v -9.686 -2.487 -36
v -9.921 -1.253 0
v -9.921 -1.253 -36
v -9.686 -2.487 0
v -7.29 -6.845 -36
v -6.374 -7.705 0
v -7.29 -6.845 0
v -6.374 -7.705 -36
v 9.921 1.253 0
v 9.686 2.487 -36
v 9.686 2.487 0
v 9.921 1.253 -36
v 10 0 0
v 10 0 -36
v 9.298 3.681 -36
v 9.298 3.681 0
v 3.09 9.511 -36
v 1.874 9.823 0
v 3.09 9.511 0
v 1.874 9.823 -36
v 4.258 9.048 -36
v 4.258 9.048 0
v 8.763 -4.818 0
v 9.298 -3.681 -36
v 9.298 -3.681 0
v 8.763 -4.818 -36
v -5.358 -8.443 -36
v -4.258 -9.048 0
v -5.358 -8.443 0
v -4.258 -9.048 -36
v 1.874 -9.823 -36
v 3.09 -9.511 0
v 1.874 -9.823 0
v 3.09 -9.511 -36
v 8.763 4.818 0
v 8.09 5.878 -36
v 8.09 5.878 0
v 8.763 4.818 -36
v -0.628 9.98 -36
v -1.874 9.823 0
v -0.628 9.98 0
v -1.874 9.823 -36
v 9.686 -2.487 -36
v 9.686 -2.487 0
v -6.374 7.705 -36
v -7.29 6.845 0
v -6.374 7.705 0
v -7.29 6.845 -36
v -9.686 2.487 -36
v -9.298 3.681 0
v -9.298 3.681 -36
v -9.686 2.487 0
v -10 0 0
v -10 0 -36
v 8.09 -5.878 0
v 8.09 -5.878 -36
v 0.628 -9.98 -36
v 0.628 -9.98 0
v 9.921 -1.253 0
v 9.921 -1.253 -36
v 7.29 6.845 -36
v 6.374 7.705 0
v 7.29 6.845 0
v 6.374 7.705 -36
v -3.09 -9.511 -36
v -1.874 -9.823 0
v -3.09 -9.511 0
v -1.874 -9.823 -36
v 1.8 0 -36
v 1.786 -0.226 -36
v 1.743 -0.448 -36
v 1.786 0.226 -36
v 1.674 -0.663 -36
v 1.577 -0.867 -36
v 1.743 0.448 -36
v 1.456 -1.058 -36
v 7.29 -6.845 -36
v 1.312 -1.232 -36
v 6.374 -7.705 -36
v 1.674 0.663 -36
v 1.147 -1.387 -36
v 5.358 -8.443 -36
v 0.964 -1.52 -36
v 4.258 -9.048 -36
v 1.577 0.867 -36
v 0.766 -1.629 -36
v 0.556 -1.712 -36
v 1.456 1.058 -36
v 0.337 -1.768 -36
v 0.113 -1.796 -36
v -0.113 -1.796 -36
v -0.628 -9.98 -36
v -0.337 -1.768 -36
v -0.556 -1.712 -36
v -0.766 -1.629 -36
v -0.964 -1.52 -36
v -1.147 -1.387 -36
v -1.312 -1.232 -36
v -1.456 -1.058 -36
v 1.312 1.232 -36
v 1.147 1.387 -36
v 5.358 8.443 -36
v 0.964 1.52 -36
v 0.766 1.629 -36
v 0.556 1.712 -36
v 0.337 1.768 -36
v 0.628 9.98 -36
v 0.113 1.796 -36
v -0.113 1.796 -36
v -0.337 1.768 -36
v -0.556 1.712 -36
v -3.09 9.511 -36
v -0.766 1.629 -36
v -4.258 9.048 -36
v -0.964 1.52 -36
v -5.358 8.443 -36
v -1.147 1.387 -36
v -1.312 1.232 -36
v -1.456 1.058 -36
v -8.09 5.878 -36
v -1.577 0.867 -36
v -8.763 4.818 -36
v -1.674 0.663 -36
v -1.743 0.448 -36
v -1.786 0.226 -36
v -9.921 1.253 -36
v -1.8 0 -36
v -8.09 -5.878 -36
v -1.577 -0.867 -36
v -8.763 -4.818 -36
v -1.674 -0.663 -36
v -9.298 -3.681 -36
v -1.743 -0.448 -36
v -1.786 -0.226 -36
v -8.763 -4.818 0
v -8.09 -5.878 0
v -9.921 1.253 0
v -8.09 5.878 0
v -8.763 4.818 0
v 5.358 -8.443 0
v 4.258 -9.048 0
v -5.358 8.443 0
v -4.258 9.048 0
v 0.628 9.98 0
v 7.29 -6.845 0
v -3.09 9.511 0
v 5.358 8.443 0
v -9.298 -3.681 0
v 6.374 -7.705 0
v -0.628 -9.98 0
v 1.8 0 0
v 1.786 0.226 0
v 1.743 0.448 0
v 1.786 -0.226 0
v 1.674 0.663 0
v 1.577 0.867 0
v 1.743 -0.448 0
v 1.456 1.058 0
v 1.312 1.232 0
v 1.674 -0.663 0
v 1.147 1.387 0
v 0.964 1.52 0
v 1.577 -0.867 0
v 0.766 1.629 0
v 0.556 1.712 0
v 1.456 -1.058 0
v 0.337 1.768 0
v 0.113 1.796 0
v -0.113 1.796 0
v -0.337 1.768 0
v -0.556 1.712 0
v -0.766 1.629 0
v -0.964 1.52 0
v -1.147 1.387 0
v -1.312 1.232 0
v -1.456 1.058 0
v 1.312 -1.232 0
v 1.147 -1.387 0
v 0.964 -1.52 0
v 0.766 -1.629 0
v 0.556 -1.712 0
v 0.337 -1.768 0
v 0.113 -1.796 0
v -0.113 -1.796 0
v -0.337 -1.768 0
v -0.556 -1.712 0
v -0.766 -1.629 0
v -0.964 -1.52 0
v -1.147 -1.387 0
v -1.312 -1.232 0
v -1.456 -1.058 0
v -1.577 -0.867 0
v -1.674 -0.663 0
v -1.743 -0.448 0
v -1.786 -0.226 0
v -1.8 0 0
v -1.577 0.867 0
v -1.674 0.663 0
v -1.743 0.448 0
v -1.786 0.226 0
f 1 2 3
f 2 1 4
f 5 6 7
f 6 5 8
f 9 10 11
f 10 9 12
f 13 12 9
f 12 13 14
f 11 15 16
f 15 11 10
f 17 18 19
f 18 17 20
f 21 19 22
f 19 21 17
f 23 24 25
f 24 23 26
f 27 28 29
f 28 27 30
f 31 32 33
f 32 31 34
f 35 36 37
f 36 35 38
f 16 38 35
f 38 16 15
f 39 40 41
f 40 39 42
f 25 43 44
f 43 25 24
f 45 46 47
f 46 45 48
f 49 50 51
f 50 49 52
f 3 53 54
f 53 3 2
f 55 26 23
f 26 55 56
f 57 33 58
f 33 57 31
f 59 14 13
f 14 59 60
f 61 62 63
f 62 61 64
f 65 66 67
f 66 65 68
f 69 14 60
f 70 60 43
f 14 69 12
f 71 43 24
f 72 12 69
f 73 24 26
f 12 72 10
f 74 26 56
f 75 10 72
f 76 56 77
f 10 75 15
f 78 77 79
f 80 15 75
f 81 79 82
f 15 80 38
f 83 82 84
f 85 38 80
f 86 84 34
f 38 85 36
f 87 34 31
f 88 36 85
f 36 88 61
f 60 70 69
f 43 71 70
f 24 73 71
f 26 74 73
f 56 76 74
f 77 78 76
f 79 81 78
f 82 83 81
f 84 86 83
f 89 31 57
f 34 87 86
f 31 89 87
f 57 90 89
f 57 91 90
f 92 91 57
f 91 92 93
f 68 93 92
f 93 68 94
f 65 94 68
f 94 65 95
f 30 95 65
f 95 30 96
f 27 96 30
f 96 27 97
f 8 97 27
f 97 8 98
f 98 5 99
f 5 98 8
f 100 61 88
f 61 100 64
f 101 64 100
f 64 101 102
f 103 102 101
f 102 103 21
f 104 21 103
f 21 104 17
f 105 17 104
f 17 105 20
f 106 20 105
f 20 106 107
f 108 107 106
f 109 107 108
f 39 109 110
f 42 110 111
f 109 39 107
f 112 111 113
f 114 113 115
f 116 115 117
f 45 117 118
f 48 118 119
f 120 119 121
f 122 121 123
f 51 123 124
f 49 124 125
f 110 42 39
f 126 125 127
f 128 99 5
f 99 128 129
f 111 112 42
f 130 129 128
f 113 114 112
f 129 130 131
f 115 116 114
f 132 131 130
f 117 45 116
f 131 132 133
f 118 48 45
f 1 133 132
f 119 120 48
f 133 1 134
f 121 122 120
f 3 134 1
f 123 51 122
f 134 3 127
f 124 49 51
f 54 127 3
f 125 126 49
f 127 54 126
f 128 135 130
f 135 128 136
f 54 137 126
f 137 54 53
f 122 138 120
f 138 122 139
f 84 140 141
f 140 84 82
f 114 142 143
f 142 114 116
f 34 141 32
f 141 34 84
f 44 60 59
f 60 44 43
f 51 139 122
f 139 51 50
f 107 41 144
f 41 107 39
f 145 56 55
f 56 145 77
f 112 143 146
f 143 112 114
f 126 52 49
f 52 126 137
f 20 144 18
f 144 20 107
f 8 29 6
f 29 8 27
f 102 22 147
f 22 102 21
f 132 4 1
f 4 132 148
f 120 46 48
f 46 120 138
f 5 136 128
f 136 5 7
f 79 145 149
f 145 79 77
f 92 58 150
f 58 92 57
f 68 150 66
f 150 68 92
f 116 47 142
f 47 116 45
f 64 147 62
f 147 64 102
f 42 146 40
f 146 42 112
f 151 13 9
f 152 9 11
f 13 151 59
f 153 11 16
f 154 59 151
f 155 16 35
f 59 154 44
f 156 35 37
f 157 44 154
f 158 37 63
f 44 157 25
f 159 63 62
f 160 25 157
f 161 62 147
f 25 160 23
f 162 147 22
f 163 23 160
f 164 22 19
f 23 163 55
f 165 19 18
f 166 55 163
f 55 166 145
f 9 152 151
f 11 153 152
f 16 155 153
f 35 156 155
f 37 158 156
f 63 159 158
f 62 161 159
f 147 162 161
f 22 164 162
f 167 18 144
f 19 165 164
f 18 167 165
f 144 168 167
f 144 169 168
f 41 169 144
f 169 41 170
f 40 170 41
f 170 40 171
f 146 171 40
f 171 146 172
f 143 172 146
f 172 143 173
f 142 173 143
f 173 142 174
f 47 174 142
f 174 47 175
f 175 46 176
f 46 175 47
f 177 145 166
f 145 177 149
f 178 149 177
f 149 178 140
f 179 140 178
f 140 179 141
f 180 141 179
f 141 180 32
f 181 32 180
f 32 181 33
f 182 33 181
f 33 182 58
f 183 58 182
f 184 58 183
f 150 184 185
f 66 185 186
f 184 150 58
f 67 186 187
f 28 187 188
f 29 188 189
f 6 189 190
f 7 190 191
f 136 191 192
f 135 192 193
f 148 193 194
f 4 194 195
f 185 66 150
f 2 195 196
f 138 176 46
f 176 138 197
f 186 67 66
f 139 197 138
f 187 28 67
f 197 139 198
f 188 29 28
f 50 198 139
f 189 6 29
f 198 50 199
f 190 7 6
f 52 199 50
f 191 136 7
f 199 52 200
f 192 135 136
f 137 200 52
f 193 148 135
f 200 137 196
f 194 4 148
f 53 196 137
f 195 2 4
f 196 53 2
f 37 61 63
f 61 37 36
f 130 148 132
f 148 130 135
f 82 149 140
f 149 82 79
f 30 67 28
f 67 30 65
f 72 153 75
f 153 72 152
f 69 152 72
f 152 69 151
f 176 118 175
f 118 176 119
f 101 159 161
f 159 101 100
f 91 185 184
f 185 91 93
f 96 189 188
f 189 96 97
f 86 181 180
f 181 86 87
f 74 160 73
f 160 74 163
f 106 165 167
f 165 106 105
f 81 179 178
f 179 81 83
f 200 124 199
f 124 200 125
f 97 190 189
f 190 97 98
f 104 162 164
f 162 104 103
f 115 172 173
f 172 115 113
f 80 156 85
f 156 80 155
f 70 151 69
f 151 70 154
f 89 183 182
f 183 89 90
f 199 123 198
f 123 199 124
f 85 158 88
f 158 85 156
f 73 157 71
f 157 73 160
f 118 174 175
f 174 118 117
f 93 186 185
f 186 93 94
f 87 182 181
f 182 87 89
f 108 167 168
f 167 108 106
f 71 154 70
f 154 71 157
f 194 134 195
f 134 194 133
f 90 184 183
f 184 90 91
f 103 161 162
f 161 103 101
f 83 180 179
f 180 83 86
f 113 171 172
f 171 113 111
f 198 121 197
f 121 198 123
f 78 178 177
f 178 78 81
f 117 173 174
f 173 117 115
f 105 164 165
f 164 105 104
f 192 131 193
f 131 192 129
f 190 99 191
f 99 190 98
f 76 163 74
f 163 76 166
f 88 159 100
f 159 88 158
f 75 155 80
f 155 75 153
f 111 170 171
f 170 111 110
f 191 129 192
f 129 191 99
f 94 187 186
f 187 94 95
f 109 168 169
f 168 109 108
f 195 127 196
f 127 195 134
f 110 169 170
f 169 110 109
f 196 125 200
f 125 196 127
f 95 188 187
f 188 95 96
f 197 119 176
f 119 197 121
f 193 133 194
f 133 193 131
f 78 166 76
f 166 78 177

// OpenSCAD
$fn = 50;


difference() {
	union() {
		translate(v = [0, 0, -36.0000000000]) {
			cylinder(h = 36, r = 10.0000000000);
		}
		cylinder(h = 0, r = 13.0000000000);
	}
	union() {
		#translate(v = [0, 0, -36]) {
			cylinder(h = 36, r = 1.8000000000);
		}
	}
}
